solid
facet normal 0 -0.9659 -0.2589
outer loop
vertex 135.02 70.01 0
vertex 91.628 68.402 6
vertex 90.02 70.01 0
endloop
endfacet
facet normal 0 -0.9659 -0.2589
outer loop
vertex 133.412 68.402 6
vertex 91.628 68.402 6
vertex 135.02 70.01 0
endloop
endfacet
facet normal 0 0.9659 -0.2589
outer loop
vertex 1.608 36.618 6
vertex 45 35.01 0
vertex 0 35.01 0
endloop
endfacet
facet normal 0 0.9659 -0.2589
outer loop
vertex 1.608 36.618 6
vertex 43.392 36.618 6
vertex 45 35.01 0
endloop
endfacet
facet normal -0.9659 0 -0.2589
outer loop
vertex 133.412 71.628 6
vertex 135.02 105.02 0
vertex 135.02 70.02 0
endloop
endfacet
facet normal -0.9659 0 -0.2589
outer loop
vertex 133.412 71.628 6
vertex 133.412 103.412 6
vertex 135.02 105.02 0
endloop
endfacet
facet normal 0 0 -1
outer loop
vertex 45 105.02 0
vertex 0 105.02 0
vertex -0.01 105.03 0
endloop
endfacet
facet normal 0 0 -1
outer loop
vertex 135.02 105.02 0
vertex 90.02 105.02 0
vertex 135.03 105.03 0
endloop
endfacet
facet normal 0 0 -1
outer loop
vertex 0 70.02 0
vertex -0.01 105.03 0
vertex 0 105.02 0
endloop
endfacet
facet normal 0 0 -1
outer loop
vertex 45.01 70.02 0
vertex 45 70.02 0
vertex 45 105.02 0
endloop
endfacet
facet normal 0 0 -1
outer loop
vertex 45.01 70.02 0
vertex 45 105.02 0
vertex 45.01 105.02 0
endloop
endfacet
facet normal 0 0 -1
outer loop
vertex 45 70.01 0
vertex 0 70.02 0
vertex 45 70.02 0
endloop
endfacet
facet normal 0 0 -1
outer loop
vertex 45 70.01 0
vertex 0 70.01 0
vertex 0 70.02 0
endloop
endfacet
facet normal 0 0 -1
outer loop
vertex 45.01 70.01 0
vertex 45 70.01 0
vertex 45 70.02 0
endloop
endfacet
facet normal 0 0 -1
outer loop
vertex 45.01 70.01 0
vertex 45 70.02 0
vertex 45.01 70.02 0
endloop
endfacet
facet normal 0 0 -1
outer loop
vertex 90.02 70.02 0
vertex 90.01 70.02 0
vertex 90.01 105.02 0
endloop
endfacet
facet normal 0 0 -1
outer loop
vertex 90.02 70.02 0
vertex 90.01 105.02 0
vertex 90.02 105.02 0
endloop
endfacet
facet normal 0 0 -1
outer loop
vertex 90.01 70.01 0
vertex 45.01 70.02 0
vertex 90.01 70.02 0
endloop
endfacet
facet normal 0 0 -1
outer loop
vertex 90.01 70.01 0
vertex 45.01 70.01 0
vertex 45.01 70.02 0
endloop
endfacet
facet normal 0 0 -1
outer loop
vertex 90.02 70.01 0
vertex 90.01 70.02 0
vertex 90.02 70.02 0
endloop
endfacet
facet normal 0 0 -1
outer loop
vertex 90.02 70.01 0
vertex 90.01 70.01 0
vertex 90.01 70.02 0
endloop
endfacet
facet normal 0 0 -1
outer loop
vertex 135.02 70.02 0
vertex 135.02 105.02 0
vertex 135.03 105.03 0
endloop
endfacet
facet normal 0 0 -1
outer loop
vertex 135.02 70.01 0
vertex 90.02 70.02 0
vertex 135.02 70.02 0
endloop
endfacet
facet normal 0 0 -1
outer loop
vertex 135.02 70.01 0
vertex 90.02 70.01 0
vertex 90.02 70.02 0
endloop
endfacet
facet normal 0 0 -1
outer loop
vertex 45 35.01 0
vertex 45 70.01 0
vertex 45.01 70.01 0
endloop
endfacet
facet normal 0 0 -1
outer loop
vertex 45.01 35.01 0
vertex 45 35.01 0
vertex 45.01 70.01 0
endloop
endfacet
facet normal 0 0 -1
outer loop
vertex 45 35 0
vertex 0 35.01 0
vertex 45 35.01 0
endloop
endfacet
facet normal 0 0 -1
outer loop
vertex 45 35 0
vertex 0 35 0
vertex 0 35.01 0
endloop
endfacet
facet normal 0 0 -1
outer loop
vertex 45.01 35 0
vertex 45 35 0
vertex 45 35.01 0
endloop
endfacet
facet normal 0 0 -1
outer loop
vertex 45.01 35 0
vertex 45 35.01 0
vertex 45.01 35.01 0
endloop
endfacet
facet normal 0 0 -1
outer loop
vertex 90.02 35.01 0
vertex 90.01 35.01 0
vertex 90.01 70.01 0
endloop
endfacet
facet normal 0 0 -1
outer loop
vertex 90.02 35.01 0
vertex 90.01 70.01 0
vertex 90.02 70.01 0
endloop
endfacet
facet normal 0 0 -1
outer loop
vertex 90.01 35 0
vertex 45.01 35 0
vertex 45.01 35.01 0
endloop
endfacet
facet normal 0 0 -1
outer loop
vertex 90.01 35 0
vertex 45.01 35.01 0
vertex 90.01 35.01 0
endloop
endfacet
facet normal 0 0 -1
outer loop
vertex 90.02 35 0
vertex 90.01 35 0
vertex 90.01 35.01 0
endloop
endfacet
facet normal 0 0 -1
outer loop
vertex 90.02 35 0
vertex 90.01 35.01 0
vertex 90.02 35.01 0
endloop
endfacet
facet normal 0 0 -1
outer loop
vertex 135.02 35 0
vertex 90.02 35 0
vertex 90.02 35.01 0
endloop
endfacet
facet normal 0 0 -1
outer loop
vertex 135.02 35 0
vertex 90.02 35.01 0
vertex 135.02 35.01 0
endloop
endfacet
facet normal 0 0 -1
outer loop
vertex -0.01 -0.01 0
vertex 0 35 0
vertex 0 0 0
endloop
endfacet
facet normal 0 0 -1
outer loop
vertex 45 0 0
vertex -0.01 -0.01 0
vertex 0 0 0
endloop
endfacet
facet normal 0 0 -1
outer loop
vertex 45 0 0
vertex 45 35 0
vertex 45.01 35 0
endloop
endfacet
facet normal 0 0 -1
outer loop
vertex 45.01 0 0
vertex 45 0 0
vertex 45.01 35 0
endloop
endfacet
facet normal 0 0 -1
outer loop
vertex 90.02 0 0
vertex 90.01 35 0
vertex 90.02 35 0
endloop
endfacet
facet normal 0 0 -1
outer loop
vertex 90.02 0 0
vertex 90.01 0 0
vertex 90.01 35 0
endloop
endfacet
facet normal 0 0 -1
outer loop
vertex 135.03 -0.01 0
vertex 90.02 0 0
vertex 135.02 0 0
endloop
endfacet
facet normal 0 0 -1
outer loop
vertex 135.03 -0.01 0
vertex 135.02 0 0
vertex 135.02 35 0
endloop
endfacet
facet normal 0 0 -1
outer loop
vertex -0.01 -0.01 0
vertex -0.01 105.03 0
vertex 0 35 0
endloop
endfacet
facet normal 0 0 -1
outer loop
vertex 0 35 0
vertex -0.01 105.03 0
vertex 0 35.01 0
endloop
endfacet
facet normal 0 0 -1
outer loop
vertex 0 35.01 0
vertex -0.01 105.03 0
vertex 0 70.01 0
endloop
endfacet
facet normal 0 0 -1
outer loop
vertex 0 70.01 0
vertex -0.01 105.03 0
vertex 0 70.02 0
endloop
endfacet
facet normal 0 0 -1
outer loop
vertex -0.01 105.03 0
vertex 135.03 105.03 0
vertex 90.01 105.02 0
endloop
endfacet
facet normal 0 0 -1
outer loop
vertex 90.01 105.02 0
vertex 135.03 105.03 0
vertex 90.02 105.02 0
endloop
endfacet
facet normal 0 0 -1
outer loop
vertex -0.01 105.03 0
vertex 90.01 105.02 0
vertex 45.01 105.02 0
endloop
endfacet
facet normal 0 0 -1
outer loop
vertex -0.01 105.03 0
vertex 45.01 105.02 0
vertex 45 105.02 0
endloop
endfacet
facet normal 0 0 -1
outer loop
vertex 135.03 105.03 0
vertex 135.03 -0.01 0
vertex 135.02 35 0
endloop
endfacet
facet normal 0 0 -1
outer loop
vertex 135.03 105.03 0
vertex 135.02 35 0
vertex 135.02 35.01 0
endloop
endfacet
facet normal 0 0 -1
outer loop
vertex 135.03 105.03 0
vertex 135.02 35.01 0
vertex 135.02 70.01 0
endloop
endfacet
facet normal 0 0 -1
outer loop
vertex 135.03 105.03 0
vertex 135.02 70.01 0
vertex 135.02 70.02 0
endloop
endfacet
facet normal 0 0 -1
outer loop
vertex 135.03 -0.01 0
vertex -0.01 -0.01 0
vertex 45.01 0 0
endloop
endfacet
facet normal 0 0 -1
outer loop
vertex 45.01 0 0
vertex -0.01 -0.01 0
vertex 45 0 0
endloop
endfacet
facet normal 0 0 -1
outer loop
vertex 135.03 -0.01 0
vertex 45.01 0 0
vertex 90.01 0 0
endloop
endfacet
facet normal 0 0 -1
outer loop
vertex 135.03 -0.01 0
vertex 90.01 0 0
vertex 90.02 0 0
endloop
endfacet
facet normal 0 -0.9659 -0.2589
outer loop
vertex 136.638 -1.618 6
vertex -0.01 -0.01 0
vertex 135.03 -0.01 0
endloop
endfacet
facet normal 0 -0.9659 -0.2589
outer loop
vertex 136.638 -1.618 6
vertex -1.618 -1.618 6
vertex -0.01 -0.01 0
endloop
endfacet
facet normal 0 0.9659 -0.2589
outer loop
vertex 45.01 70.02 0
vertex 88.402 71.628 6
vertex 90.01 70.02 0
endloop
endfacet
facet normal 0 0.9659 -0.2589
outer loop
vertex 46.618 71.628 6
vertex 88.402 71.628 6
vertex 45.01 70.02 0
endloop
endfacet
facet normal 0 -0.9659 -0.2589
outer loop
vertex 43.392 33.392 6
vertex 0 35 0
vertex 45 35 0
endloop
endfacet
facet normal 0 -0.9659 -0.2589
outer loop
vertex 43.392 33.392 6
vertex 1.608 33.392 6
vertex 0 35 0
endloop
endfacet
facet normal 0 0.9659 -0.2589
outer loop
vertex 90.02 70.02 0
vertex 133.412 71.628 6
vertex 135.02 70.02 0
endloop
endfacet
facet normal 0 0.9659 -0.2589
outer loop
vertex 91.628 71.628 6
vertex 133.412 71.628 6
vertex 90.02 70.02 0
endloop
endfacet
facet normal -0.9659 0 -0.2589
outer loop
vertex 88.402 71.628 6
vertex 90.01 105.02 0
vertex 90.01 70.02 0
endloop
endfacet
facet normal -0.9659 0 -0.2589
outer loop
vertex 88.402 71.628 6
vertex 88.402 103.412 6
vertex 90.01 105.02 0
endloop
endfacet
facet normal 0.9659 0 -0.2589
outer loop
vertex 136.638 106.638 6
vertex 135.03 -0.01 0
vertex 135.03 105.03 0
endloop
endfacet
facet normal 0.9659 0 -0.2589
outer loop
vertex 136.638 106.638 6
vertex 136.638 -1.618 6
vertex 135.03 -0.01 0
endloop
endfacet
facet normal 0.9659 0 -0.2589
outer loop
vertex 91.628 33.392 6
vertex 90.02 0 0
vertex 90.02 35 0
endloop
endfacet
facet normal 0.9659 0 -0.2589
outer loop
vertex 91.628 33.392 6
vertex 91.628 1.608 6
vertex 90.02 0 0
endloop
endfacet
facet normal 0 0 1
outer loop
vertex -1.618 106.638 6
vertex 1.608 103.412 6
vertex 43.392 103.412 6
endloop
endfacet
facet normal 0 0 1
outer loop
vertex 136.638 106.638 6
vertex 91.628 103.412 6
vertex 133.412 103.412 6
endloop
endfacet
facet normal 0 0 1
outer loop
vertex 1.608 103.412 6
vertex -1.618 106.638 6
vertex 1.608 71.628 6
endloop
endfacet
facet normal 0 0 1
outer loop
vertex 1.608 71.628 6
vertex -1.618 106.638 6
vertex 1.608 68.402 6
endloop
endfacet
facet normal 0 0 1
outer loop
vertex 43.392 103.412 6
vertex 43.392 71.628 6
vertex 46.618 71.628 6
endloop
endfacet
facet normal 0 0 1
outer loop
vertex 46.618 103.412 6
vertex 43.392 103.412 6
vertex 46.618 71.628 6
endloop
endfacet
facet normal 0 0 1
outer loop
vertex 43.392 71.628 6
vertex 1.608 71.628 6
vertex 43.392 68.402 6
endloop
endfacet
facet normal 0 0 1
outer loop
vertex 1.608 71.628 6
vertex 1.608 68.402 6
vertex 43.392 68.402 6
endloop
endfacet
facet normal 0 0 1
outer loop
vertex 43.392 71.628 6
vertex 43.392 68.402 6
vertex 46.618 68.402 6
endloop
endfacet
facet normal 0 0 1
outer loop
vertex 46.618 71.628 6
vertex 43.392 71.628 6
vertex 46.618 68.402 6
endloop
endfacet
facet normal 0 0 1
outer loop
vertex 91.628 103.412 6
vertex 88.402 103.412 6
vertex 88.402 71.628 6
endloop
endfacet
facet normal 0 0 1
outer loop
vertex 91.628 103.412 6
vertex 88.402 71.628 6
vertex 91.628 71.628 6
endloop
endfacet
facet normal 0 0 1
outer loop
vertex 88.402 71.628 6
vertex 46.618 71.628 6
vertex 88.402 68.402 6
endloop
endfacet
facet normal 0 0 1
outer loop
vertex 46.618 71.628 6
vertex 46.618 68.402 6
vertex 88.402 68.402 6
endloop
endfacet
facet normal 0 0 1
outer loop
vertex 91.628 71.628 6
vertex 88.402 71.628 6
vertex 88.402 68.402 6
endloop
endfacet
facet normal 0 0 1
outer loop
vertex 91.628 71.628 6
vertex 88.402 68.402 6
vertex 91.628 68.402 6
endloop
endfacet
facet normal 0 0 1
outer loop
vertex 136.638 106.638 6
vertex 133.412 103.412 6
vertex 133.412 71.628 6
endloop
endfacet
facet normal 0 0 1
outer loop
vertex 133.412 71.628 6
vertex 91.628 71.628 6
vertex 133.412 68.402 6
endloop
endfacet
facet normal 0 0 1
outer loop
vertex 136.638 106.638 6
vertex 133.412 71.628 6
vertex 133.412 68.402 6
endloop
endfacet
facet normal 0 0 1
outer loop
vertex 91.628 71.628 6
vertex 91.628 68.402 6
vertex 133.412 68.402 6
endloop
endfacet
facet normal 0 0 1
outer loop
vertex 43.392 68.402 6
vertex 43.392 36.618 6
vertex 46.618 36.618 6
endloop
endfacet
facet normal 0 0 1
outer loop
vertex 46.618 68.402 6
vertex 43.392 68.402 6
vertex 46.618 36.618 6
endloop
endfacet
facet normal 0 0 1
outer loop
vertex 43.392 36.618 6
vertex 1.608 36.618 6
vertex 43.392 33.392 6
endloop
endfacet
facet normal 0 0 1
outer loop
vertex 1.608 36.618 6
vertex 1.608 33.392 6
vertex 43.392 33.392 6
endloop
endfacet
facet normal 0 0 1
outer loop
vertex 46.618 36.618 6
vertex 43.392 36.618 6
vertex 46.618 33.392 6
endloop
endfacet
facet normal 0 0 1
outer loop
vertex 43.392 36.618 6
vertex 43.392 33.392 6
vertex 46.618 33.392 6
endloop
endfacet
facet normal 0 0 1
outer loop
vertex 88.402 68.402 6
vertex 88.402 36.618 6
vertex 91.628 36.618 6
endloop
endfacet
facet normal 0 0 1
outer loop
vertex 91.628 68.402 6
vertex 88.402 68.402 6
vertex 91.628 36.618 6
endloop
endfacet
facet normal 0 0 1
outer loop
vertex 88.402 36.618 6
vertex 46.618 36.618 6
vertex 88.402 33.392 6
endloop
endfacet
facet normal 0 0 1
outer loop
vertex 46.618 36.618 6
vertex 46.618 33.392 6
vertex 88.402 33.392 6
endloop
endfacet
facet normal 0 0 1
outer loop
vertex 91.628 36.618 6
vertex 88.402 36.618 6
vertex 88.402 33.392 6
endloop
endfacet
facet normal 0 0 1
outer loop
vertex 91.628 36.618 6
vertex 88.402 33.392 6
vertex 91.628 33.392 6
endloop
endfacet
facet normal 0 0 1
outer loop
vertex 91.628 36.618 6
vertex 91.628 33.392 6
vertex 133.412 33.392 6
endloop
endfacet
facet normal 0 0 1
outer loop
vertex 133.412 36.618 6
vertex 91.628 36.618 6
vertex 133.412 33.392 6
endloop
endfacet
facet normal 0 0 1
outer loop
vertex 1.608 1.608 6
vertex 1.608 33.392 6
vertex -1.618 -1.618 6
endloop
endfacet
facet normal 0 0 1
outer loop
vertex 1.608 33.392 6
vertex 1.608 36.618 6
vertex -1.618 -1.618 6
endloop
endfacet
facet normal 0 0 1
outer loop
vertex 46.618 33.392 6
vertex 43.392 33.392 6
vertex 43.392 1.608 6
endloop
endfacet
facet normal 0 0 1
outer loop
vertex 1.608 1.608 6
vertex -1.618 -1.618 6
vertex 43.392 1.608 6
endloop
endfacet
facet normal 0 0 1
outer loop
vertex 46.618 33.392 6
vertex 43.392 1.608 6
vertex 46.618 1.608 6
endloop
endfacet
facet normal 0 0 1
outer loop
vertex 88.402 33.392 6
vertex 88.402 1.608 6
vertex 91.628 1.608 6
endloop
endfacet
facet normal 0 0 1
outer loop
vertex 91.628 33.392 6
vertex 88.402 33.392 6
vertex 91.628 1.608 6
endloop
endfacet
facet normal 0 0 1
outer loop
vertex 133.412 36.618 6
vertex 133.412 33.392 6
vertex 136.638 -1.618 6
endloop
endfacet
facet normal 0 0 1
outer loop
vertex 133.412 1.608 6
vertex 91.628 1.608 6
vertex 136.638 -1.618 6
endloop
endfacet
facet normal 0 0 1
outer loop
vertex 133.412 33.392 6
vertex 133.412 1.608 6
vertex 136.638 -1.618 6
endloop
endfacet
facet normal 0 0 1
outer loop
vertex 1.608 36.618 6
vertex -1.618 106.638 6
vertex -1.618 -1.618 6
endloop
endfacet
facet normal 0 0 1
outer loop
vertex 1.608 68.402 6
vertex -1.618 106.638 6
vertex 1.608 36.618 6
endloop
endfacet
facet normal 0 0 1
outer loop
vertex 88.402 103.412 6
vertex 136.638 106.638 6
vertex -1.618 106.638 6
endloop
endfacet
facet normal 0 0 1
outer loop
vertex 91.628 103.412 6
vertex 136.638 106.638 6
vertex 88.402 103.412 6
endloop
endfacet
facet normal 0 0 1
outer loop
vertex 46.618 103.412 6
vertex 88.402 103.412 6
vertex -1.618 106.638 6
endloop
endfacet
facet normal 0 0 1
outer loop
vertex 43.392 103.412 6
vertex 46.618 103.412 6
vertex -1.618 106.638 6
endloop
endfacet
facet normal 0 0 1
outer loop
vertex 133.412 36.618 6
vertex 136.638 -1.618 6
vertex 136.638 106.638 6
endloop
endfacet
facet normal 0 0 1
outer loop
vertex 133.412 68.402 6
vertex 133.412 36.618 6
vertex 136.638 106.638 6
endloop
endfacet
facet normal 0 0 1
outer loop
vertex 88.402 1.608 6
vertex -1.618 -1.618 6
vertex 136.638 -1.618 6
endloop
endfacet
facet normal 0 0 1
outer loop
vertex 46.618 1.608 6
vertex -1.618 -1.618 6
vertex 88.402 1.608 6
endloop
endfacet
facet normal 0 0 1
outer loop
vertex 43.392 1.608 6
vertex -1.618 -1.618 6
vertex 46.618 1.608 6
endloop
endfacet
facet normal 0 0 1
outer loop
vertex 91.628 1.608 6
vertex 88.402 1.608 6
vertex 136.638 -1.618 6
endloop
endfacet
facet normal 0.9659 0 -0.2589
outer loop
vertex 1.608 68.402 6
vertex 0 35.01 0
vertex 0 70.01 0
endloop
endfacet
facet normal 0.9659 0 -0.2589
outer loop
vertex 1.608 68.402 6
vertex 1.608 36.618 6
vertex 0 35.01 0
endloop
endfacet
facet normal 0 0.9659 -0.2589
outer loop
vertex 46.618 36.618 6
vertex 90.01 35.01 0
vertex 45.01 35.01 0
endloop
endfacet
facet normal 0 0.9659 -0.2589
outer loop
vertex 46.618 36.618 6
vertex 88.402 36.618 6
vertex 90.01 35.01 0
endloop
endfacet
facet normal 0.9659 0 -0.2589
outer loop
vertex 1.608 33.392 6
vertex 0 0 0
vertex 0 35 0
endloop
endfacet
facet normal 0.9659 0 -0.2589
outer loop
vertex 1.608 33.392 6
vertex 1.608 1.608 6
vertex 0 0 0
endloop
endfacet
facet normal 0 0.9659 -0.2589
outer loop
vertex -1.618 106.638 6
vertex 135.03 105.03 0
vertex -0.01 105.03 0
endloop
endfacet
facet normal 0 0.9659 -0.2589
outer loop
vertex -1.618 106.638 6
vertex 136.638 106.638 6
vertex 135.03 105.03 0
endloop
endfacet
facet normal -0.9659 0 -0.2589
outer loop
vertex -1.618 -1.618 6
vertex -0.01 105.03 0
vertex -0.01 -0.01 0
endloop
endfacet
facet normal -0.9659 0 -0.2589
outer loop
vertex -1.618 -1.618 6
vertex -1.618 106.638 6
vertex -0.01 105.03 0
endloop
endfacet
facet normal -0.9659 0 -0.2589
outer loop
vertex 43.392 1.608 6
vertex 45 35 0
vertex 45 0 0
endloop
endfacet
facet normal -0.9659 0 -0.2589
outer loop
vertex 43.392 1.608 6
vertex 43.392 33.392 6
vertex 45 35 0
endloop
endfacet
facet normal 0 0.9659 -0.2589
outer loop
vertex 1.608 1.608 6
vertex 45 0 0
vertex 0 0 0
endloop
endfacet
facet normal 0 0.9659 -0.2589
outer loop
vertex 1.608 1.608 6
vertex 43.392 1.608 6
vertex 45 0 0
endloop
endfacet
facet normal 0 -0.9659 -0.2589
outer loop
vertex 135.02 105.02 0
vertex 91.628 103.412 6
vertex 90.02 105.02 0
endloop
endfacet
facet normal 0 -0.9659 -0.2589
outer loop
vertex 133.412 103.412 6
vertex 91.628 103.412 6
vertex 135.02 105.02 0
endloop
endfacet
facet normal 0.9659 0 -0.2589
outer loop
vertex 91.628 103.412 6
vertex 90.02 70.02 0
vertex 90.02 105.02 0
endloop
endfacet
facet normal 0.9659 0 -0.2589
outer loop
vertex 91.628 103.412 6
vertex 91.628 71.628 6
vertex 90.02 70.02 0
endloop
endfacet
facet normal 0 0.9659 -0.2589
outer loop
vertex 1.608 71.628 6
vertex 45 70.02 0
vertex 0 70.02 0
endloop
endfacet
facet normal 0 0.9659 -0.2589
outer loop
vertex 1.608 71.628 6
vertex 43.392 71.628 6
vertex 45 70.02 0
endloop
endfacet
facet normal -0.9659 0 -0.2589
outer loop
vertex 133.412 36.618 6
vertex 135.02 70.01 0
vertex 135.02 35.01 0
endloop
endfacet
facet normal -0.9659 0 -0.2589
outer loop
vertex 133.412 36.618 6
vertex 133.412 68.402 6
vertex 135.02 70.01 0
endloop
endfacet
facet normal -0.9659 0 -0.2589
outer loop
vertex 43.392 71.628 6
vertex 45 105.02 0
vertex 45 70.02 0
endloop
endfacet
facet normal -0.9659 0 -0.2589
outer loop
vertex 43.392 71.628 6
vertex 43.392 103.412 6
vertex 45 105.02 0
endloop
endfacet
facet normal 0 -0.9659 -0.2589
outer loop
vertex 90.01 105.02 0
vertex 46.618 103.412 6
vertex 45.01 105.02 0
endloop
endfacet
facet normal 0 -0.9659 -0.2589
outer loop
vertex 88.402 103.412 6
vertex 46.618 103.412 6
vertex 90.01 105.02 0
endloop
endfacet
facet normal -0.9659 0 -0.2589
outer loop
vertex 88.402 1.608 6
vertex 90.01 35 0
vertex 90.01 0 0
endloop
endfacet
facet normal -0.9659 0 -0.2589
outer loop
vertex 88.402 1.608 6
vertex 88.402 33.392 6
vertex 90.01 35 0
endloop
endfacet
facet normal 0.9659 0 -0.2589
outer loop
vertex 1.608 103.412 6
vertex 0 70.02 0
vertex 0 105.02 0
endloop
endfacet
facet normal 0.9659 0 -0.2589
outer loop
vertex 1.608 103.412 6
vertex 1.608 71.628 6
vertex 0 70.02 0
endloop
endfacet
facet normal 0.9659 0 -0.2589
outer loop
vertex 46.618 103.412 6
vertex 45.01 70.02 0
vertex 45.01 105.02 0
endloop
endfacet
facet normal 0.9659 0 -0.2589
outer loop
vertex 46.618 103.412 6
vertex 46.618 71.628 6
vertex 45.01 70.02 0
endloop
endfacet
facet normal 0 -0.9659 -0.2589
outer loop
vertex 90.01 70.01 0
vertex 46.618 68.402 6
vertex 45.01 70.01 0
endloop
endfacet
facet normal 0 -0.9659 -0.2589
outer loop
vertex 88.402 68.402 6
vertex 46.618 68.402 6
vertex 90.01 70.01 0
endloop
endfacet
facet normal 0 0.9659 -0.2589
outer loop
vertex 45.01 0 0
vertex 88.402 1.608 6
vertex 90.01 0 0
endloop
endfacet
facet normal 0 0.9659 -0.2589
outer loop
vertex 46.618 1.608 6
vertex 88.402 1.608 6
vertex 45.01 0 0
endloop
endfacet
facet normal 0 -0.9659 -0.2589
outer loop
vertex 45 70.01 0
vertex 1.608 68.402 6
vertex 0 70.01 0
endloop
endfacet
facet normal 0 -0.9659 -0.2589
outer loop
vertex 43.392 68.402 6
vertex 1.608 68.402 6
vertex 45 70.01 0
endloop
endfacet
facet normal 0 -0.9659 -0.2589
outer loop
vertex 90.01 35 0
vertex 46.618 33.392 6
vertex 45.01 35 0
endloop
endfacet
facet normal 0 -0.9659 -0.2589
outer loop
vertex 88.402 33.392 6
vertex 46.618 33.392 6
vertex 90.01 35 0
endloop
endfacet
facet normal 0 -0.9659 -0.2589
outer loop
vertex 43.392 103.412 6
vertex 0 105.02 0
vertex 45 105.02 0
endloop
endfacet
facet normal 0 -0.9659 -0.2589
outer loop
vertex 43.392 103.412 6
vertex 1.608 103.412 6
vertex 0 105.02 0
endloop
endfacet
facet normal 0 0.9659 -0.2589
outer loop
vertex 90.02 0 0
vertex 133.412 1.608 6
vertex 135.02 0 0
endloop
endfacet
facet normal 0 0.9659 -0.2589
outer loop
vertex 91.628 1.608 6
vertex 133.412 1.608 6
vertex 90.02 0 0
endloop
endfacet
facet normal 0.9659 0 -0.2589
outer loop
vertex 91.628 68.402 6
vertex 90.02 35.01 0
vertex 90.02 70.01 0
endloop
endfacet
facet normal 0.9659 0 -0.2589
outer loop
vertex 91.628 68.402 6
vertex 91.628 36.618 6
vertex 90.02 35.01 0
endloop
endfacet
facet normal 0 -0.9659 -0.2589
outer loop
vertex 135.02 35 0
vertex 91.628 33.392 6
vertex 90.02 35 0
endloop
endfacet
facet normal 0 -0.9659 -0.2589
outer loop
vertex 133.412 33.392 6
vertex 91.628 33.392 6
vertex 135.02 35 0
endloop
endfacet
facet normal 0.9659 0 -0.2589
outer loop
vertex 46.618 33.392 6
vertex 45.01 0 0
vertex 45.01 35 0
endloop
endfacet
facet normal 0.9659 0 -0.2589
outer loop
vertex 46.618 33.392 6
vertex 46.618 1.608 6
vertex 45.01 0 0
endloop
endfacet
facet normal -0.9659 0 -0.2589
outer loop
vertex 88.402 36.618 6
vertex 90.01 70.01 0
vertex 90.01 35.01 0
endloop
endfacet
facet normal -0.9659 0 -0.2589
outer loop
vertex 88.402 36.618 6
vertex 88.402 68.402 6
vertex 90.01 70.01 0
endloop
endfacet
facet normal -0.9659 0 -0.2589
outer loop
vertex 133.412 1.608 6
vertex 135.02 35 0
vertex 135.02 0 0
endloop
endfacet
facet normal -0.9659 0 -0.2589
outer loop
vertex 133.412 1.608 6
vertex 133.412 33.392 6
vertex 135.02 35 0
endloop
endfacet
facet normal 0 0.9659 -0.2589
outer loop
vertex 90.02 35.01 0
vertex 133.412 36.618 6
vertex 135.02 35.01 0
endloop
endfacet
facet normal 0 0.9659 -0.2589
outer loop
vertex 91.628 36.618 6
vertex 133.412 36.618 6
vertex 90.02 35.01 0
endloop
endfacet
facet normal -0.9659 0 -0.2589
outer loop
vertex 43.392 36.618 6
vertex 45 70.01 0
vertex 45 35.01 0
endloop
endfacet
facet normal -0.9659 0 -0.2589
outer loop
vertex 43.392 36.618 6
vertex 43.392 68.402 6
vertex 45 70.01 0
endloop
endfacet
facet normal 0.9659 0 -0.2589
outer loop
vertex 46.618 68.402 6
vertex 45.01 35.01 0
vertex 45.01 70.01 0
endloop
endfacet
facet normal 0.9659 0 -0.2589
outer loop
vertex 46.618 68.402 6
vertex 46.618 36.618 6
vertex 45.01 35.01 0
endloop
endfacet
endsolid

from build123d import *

# Parameters (mm, degrees)
F0_W     = 45
F0_H     = 0.01
F0_W_2   = 0.01
F0_H_2   = 35
F1_DEPTH = 6
F1_TAPER = -15


with BuildPart() as f1:
    # F0 (on Top) → F1 (new body)
    with BuildSketch(Plane.XY):
        with Locations((67.51, 105.025)):
            Rectangle(F0_W, F0_H)
        Polygon((90.02, 0), (90.02, -0.01), (135.03, -0.01), (135.03, 35), (135.02, 35), (135.02, 0), align=None)
        Polygon((-0.01, 105.03), (-0.01, 70.02), (0, 70.02), (0, 105.02), (45, 105.02), (45, 105.03), align=None)
        with Locations((-0.005, 52.51)):
            Rectangle(F0_W_2, F0_H_2)
        Polygon((45, 0), (0, 0), (0, 35), (-0.01, 35), (-0.01, -0.01), (45, -0.01), align=None)
        Polygon((90.02, 105.03), (90.02, 105.02), (135.02, 105.02), (135.02, 70.02), (135.03, 70.02), (135.03, 105.03), align=None)
        with Locations((135.025, 52.51)):
            Rectangle(F0_W_2, F0_H_2)
        with Locations((67.51, -0.005)):
            Rectangle(F0_W, F0_H)
        Polygon((-0.01, 35), (0, 35), (45, 35), (45, 35.01), (0, 35.01), (-0.01, 35.01), align=None)
        with Locations((90.015, 52.51)):
            Rectangle(F0_W_2, F0_H_2)
        Polygon((90.02, 35), (90.01, 35), (90.01, 0), (90.01, -0.01), (90.02, -0.01), (90.02, 0), align=None)
        Polygon((45, 105.02), (45, 70.02), (45.01, 70.02), (45.01, 105.02), (45.01, 105.03), (45, 105.03), align=None)
        Polygon((45, 35), (45, 0), (45, -0.01), (45.01, -0.01), (45.01, 0), (45.01, 35), align=None)
        Polygon((90.01, 105.02), (90.01, 70.02), (90.02, 70.02), (90.02, 105.02), (90.02, 105.03), (90.01, 105.03), align=None)
        with Locations((67.51, 70.015)):
            Rectangle(F0_W, F0_H)
        with Locations((45.005, 52.51)):
            Rectangle(F0_W_2, F0_H_2)
        with Locations((67.51, 35.005)):
            Rectangle(F0_W, F0_H)
        Polygon((90.02, 70.02), (90.02, 70.01), (135.02, 70.01), (135.03, 70.01), (135.03, 70.02), (135.02, 70.02), align=None)
        Polygon((90.02, 35.01), (90.02, 35), (135.02, 35), (135.03, 35), (135.03, 35.01), (135.02, 35.01), align=None)
        Polygon((0, 70.01), (45, 70.01), (45, 70.02), (0, 70.02), (-0.01, 70.02), (-0.01, 70.01), align=None)
        with Locations((90.015, 35.005)):
            Rectangle(F0_W_2, F0_H)
        with Locations((45.005, 70.015)):
            Rectangle(F0_W_2, F0_H)
        with Locations((45.005, 35.005)):
            Rectangle(F0_W_2, F0_H)
        with Locations((90.015, 70.015)):
            Rectangle(F0_W_2, F0_H)
    extrude(amount=F1_DEPTH, taper=F1_TAPER)


solid = f1.part
